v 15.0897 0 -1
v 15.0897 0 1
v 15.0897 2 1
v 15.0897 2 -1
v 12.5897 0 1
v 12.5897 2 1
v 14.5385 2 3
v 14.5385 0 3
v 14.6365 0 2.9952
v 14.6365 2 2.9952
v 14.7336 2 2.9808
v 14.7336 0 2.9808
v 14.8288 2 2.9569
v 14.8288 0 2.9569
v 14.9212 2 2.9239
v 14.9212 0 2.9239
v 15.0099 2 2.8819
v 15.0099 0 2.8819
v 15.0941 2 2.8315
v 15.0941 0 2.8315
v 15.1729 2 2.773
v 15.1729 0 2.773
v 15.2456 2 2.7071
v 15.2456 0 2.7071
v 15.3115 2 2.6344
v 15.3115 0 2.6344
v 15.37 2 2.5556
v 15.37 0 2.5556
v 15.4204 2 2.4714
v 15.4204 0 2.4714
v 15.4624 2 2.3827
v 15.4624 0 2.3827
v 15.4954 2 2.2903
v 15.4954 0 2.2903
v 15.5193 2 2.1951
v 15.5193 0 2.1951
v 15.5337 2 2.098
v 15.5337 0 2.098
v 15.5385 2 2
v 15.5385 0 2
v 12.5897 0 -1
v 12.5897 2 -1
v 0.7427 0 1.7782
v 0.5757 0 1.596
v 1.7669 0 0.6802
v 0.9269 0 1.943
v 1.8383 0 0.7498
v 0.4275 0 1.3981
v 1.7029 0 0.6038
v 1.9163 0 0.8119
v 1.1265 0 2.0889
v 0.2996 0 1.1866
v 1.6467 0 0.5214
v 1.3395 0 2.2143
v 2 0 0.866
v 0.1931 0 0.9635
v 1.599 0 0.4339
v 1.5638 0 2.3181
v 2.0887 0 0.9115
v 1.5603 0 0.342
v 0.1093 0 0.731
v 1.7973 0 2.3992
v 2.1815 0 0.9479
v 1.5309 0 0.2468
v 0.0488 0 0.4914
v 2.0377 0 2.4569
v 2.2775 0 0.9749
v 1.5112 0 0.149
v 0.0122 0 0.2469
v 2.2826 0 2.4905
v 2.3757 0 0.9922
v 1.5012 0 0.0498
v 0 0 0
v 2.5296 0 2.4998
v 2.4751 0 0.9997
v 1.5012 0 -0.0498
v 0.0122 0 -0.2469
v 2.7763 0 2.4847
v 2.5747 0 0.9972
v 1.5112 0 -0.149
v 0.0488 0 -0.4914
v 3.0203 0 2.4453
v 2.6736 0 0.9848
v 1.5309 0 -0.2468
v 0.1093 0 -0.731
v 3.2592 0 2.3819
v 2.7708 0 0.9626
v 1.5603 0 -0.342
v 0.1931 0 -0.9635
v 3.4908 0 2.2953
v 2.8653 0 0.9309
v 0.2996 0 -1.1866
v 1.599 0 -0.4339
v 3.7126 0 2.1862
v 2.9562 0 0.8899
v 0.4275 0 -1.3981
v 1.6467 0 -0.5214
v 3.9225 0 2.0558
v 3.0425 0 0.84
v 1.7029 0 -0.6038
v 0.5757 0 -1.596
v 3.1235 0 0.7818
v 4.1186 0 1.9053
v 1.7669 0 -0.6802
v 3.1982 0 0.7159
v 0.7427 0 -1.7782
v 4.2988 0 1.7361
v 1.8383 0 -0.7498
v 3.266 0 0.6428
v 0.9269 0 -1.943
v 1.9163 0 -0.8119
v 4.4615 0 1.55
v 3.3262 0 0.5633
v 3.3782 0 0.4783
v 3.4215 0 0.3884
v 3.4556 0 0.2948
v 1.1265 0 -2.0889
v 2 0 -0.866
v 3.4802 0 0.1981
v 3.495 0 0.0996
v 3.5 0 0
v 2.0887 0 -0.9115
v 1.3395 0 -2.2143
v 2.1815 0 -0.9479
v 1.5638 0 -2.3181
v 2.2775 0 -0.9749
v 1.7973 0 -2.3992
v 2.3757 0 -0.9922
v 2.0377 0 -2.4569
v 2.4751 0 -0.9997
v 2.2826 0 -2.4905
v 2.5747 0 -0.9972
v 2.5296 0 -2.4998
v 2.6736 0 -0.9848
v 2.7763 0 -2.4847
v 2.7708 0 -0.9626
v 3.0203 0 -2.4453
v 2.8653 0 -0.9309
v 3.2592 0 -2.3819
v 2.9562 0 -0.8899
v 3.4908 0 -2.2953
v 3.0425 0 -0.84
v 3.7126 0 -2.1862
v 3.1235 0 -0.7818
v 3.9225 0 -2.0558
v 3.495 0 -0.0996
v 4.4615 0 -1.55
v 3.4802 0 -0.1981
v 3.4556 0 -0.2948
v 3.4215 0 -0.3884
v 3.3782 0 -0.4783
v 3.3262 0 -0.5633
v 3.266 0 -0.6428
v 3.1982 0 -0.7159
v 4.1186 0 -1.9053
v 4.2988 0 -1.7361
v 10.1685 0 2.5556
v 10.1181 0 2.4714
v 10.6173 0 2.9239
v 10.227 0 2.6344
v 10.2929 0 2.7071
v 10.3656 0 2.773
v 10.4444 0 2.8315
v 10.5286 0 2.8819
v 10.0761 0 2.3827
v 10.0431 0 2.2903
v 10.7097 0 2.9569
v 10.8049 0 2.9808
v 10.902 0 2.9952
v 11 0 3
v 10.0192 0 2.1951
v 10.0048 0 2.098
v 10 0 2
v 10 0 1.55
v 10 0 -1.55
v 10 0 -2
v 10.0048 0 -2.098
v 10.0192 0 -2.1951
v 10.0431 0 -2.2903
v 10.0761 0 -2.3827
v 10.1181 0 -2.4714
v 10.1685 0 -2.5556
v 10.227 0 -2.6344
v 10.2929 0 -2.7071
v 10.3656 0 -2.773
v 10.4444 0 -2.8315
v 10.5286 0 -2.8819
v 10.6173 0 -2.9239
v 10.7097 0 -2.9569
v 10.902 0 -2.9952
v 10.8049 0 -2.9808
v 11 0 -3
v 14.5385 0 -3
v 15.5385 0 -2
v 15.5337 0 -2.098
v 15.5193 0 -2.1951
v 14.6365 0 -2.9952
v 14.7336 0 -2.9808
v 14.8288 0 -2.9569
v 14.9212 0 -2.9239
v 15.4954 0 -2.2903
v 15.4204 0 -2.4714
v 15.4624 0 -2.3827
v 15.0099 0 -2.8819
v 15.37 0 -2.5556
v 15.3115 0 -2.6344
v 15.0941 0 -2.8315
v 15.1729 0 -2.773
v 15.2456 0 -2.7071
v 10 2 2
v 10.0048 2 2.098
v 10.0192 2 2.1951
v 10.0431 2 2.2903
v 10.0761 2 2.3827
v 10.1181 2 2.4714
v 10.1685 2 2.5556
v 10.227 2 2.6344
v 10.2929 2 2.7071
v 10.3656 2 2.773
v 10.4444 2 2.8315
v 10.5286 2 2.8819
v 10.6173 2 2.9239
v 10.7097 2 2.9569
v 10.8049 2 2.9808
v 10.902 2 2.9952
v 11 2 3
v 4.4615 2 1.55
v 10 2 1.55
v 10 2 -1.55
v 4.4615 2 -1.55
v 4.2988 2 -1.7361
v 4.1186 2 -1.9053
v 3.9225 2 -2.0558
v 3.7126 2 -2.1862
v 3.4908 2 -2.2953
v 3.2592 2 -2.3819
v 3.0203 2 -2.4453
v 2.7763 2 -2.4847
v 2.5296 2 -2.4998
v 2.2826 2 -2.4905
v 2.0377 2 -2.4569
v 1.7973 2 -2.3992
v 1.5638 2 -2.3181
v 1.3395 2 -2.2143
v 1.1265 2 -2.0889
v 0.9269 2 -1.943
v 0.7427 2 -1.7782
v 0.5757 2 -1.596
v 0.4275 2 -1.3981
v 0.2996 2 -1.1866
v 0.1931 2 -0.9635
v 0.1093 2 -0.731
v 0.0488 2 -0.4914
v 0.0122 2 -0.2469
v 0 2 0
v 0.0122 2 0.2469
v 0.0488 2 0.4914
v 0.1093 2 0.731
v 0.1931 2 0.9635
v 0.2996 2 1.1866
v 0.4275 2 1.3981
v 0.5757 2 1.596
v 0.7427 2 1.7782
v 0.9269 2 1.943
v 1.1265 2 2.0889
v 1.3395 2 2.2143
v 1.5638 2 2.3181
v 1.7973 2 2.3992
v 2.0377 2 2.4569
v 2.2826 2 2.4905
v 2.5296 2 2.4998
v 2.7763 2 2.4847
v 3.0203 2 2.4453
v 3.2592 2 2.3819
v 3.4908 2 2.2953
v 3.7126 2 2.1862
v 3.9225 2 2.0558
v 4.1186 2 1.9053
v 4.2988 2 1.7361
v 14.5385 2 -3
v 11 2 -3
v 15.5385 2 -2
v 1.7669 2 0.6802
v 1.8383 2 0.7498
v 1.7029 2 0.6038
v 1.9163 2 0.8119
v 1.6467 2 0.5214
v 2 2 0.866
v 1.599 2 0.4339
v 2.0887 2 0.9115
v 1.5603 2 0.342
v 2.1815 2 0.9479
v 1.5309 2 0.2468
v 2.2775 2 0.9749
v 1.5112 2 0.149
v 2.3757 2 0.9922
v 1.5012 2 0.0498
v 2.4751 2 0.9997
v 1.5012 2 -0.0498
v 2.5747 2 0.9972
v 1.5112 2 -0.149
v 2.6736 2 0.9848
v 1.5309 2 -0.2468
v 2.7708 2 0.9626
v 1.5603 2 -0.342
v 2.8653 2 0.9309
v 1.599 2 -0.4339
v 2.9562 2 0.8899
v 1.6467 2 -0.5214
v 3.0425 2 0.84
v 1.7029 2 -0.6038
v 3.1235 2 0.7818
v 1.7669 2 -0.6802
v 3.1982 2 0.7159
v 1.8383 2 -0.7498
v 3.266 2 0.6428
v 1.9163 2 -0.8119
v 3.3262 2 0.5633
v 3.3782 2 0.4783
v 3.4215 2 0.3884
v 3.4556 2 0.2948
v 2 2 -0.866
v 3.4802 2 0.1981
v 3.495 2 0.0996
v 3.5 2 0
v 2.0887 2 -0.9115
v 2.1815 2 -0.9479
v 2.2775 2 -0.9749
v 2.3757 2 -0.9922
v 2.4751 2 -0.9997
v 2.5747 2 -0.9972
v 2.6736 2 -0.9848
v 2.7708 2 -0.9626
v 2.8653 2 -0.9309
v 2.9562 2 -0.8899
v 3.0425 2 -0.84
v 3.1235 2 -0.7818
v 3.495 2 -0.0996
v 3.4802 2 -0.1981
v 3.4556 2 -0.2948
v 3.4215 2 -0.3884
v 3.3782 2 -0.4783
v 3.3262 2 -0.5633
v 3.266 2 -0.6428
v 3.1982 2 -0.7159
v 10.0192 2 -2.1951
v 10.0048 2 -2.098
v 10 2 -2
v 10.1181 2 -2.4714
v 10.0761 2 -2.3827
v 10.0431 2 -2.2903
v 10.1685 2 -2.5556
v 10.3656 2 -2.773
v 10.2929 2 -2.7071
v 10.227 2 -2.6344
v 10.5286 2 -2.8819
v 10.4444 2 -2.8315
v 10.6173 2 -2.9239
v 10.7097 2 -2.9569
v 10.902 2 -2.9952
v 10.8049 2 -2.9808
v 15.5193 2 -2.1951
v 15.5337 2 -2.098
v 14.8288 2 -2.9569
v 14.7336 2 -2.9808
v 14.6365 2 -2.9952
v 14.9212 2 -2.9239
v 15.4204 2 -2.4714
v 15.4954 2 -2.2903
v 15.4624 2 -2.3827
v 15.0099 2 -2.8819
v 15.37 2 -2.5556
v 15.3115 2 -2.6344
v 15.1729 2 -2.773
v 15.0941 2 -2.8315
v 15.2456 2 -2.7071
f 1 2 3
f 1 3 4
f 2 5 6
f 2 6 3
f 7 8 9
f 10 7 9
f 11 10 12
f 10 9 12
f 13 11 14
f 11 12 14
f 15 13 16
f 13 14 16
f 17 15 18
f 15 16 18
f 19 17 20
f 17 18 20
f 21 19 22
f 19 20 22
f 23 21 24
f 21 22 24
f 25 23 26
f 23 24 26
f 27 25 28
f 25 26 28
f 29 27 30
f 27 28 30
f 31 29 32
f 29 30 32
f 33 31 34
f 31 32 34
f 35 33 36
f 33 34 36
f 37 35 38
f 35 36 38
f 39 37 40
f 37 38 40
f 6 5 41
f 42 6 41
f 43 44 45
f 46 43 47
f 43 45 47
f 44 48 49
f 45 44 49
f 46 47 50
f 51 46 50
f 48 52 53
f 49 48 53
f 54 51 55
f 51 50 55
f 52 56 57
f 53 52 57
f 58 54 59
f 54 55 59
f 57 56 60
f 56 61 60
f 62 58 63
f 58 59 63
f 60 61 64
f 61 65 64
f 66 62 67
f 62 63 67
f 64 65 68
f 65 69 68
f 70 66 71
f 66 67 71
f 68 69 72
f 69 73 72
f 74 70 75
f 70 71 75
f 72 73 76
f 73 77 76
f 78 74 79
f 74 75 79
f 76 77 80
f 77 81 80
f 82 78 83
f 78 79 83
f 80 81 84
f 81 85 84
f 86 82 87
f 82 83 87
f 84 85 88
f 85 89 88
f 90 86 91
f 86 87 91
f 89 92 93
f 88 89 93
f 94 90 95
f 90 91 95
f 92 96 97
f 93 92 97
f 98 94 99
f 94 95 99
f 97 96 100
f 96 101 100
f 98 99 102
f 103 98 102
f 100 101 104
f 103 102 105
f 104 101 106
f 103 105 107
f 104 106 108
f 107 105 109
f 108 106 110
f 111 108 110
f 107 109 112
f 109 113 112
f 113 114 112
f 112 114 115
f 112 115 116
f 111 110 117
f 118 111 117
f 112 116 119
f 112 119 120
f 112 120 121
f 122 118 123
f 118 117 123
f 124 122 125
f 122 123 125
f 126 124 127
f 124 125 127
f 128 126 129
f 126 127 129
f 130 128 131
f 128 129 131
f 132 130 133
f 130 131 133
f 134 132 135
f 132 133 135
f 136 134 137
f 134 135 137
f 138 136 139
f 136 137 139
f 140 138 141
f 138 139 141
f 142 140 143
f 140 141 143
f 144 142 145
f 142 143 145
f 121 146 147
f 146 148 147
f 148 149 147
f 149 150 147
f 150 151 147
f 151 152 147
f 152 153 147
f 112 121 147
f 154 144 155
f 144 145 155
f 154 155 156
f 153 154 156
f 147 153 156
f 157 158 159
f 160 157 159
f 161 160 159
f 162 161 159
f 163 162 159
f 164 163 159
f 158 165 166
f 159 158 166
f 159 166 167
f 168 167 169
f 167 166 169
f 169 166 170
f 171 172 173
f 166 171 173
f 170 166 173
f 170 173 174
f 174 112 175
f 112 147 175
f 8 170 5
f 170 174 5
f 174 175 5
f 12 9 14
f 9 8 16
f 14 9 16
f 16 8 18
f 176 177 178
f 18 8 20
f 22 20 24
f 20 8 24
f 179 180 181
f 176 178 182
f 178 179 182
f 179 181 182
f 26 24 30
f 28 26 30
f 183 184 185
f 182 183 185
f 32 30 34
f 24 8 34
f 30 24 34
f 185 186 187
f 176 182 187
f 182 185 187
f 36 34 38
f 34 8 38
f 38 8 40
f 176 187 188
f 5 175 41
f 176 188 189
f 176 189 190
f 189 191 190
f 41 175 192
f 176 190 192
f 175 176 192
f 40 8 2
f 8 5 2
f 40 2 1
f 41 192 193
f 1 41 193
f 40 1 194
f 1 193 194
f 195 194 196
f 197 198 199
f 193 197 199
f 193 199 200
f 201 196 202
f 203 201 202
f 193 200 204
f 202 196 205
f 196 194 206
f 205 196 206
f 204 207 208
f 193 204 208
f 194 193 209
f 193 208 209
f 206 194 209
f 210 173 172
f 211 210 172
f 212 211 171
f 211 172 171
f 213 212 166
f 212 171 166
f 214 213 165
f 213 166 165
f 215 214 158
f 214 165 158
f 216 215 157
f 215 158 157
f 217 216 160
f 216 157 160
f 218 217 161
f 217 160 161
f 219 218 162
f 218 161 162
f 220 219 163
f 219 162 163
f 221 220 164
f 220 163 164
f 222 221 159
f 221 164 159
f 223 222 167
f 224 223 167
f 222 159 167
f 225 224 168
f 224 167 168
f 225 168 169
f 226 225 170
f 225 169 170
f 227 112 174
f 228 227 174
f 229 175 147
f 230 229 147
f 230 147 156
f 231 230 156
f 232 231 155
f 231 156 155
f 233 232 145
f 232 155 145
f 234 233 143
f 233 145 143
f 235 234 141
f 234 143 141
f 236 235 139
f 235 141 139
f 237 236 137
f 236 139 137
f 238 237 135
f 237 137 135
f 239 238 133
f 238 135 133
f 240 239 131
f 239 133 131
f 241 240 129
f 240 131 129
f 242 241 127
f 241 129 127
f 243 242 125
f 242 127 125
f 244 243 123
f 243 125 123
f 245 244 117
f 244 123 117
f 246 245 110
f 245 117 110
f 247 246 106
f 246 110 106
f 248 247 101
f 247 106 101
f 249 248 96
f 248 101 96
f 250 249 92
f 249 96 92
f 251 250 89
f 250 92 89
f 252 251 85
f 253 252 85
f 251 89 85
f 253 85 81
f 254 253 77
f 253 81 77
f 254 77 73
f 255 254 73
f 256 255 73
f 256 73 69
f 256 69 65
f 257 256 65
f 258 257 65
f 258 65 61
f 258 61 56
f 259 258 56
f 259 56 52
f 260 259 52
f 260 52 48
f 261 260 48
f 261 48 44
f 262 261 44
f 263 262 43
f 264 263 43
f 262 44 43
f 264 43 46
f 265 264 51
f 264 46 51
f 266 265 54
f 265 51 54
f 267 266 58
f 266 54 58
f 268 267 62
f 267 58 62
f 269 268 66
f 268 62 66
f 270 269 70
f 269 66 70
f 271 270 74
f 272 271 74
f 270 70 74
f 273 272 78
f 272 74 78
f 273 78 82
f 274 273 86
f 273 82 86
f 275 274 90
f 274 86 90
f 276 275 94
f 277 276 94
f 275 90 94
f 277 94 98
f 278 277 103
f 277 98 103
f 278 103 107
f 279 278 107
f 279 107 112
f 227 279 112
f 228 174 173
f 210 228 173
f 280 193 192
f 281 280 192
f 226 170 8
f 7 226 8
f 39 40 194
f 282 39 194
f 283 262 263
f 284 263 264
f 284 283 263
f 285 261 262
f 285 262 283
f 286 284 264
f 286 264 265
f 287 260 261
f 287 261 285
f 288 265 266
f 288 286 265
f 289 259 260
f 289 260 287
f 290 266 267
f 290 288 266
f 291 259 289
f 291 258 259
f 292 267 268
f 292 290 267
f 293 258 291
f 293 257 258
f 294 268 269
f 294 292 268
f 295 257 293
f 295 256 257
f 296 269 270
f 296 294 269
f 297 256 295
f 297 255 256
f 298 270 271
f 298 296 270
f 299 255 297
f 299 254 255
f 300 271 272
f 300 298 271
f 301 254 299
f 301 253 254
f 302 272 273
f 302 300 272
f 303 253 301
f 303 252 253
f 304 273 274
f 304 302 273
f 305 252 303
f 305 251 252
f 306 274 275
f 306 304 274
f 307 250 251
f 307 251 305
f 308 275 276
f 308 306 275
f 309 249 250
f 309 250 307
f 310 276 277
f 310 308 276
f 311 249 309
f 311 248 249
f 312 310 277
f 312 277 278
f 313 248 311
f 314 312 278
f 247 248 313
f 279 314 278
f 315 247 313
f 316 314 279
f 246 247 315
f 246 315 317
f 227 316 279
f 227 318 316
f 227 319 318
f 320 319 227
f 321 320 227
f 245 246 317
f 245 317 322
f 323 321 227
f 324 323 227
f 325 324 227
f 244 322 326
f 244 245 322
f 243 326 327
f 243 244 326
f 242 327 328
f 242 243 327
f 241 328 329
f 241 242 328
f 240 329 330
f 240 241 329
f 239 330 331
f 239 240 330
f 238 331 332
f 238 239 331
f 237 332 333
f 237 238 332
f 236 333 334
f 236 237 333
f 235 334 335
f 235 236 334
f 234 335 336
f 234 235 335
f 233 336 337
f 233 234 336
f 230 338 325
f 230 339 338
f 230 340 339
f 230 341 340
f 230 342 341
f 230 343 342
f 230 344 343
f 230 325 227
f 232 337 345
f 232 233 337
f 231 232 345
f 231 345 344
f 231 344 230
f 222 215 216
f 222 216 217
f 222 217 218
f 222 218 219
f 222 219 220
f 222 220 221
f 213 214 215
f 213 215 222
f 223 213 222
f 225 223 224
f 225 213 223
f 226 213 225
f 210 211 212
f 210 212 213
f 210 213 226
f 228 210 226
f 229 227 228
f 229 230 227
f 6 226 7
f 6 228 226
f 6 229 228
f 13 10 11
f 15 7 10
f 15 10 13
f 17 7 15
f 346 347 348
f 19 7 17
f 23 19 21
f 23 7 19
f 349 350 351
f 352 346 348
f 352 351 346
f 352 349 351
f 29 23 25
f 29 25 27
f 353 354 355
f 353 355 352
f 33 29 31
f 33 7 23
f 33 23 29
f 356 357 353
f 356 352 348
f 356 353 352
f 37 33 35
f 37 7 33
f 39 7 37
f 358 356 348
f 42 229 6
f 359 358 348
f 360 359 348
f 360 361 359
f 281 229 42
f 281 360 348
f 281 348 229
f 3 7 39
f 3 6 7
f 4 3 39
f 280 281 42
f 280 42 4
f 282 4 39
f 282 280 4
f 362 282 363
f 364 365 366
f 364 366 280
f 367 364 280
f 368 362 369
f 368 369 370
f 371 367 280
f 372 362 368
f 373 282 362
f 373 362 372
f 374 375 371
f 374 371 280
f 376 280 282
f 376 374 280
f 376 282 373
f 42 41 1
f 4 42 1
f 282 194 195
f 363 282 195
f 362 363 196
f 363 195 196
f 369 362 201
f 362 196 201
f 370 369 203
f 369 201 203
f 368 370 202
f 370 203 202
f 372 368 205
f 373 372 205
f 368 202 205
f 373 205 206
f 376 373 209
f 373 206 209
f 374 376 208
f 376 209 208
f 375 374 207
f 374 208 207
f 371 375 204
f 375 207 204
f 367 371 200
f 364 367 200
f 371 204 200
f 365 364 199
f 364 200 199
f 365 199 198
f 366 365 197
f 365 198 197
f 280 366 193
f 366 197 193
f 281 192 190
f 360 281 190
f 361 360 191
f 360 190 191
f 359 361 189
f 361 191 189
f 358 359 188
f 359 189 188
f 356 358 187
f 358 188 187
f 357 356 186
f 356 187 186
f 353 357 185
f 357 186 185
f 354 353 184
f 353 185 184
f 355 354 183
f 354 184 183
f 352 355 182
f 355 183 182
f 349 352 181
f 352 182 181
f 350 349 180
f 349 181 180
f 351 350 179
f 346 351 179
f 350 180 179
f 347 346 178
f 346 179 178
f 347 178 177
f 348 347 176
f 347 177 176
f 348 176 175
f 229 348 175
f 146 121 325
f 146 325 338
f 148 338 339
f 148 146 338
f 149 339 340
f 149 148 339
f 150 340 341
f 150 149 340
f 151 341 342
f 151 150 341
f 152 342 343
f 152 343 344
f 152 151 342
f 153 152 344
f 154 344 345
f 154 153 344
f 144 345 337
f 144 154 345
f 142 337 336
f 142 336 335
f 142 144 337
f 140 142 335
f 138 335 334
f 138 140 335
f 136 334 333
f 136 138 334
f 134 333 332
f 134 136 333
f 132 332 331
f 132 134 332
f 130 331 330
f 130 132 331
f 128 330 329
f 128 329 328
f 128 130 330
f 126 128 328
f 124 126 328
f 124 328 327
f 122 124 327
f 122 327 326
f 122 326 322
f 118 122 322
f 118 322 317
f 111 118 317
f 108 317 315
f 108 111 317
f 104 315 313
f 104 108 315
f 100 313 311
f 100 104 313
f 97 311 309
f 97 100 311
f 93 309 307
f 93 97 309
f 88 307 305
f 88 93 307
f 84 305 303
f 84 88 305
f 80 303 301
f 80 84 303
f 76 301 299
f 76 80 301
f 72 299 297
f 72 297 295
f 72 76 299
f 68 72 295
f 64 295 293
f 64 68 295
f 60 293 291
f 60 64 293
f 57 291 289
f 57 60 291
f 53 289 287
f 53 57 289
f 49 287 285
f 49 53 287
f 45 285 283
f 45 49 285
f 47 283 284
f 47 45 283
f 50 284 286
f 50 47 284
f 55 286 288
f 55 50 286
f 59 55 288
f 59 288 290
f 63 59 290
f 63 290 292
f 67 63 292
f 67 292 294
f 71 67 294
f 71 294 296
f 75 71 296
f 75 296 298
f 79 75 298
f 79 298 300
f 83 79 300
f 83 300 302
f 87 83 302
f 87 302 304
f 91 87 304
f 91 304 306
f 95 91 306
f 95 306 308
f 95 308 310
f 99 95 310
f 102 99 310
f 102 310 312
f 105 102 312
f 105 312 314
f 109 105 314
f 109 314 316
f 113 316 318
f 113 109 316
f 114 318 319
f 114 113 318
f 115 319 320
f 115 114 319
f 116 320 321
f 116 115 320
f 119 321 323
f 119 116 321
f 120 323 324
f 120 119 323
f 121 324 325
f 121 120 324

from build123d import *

# Parameters (mm, degrees)
SKETCH1_R           = 1
SKETCH1_W           = 2.5
SKETCH1_H           = 2
BOSS_EXTRUDE4_DEPTH = 2


with BuildPart() as part:
    # Sketch1 → Boss-Extrude4 (new body)
    with BuildSketch(Plane(origin=(0, 0, 0), x_dir=(1, 0, 0), z_dir=(0, 1, 0))):
        with BuildLine():
            Line((4.461504525, -1.55), (10, -1.55))
            Line((10, -1.55), (10, -2))
            ThreePointArc((10, -2), (10.292893219, -2.707106781), (11, -3))
            Line((11, -3), (14.538495475, -3))
            ThreePointArc((14.538495475, -3), (15.245602257, -2.707106781), (15.538495475, -2))
            Line((15.538495475, -2), (15.538495475, 2))
            ThreePointArc((15.538495475, 2), (15.245602257, 2.707106781), (14.538495475, 3))
            Line((14.538495475, 3), (11, 3))
            ThreePointArc((11, 3), (10.292893219, 2.707106781), (10, 2))
            Line((10, 2), (10, 1.55))
            Line((10, 1.55), (4.461504525, 1.55))
            ThreePointArc((4.461504525, 1.55), (0, 0), (4.461504525, -1.55))
        make_face()
        with Locations((2.5, 0)):
            Circle(SKETCH1_R, mode=Mode.SUBTRACT)
        with Locations((13.839657546, 0)):
            Rectangle(SKETCH1_W, SKETCH1_H, mode=Mode.SUBTRACT)
    extrude(amount=BOSS_EXTRUDE4_DEPTH)


solid = part.part
